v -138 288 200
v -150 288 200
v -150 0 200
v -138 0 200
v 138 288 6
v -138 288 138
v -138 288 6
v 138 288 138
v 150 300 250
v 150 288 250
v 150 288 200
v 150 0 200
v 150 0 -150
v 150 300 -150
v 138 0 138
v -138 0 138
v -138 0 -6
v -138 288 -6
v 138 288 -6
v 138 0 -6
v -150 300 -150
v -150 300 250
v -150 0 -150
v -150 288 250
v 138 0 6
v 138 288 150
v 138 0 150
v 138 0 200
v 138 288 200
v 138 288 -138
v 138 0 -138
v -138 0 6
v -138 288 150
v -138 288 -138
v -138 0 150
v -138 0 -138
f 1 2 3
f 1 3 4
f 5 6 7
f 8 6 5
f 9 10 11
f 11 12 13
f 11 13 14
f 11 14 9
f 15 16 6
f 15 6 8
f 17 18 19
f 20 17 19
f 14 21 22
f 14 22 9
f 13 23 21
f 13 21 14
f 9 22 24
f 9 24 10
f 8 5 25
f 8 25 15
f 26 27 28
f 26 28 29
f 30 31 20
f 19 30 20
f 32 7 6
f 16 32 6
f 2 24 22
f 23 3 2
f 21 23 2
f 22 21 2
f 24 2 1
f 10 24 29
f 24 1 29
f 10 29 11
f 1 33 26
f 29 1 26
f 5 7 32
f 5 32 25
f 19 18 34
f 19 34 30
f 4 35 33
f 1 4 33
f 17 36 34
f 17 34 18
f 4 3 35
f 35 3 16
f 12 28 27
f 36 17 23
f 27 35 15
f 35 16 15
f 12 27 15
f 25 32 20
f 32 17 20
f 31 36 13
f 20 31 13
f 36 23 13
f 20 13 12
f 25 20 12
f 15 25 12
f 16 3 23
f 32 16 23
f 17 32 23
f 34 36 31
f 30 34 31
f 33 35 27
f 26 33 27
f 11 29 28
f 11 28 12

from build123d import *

# Parameters (mm, degrees)
F0_W      = 300
F0_H      = 300
F1_DEPTH  = 300
F2_T      = -12
F3_W      = 276
F3_H      = 12
F4_DEPTH  = 288
F5_W      = 300
F5_H      = 12
F6_DEPTH  = 100
F7_W      = 12
F7_H      = 288
F8_DEPTH  = 50
F9_W      = 12
F9_H      = 288
F10_DEPTH = 50


with BuildPart() as f1:
    # F0 (on Front) → F1 (new body)
    with BuildSketch(Plane.XZ):
        Rectangle(F0_W, F0_H)
    extrude(amount=-F1_DEPTH)

    # F2
    f2_openings = [f1.faces().sort_by_distance(p)[0] for p in [
        (0, 0, 0),
    ]]
    offset(amount=F2_T, openings=f2_openings)

    # F3 (on face) → F4 (join)
    with BuildSketch(Plane.XZ.offset(-288)):
        Rectangle(F3_W, F3_H)
    extrude(amount=F4_DEPTH)

    # F5 (on face) → F6 (join)
    with BuildSketch(Plane.XY.offset(150)):
        with Locations((0, 294)):
            Rectangle(F5_W, F5_H)
    extrude(amount=F6_DEPTH)

    # F7 (on face) → F8 (join)
    with BuildSketch(Plane.XY.offset(150)):
        with Locations((-144, 144)):
            Rectangle(F7_W, F7_H)
    extrude(amount=F8_DEPTH)

    # F9 (on face) → F10 (join)
    with BuildSketch(Plane.XY.offset(150)):
        with Locations((144, 144)):
            Rectangle(F9_W, F9_H)
    extrude(amount=F10_DEPTH)


solid = f1.part
